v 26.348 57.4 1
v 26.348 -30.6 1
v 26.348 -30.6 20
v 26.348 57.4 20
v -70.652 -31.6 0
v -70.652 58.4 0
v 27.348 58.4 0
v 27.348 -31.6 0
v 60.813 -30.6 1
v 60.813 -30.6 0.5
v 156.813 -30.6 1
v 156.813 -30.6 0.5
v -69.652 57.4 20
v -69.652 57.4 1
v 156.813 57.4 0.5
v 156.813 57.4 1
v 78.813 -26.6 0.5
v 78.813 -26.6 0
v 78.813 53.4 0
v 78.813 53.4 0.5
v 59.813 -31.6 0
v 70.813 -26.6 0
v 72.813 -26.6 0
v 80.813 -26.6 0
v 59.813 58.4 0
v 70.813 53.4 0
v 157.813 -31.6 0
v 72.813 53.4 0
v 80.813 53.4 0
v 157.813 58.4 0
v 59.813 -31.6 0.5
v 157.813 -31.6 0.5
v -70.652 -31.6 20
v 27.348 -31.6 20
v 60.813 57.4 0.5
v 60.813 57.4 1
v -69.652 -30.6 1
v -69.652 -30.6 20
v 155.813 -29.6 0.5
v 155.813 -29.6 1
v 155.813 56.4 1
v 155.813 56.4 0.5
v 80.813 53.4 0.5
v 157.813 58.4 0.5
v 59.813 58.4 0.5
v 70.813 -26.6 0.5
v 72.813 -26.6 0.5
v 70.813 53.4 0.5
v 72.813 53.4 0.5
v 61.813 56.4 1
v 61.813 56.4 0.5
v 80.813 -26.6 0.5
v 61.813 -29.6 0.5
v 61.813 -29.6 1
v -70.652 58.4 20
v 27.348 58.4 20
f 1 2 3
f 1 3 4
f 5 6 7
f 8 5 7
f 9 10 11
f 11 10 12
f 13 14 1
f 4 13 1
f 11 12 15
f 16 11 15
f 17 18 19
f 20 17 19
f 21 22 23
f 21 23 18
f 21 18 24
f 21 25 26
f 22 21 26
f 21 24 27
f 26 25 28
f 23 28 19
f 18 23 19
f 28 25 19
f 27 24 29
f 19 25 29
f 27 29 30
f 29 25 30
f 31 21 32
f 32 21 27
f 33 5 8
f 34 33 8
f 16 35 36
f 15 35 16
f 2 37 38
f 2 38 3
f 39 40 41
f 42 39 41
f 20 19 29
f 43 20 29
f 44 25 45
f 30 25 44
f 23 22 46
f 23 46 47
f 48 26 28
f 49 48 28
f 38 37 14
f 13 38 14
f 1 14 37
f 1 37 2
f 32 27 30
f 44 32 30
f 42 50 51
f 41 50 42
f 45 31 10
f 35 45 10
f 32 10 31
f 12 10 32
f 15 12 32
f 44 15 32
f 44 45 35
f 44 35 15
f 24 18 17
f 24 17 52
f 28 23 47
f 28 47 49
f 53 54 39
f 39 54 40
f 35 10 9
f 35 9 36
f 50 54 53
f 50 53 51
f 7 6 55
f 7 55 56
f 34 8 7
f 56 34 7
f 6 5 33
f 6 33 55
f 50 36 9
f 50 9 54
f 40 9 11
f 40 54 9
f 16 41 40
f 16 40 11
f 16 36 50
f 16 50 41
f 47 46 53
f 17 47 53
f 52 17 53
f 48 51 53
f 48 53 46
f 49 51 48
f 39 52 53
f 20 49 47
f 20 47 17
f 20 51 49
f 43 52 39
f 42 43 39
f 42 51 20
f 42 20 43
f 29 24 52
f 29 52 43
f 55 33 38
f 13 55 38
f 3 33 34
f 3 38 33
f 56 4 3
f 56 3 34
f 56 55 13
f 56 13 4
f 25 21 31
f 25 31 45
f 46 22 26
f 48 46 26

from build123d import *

# Parameters (mm, degrees)
F0_W     = 98
F0_H     = 90
F0_W_2   = 96
F0_H_2   = 88
F1_DEPTH = 20
F2_DEPTH = 1
F3_DEPTH = 0.5
F0_W_3   = 2
F0_H_3   = 80
F4_DEPTH = 1
F5_W     = 94
F5_H     = 86
F5_W_2   = 2
F5_H_2   = 80
F6_DEPTH = 0.5


with BuildPart() as f1:
    # F0 (on Top) → F1 (new body)
    with BuildSketch(Plane.XY):
        with Locations((-21.652328, 13.399996)):
            Rectangle(F0_W, F0_H)
        with Locations((-21.652328, 13.399996)):
            Rectangle(F0_W_2, F0_H_2, mode=Mode.SUBTRACT)
    extrude(amount=F1_DEPTH)

    # F0 (on Top) → F2 (join)
    with BuildSketch(Plane.XY):
        with Locations((-21.652328, 13.399996)):
            Rectangle(F0_W_2, F0_H_2)
    extrude(amount=F2_DEPTH)


with BuildPart() as f3:
    # F0 (on Top) → F3 (new body)
    with BuildSketch(Plane.XY):
        with Locations((108.812911, 13.399996)):
            Rectangle(F0_W, F0_H)
        with Locations((108.812911, 13.399996)):
            Rectangle(F0_W_2, F0_H_2, mode=Mode.SUBTRACT)
    extrude(amount=F3_DEPTH)

    # F0 (on Top) → F4 (join)
    with BuildSketch(Plane.XY):
        with Locations((108.812911, 13.399996)):
            Rectangle(F0_W_2, F0_H_2)
        with Locations((71.812911, 13.399996)):
            Rectangle(F0_W_3, F0_H_3, mode=Mode.SUBTRACT)
        with Locations((79.812911, 13.399996)):
            Rectangle(F0_W_3, F0_H_3, mode=Mode.SUBTRACT)
    extrude(amount=F4_DEPTH)

    # F5 (on face) → F6 (cut)
    with BuildSketch(Plane.XY.offset(1)):
        with Locations((108.812911, 13.399996)):
            Rectangle(F5_W, F5_H)
        with Locations((71.812911, 13.399996)):
            Rectangle(F5_W_2, F5_H_2, mode=Mode.SUBTRACT)
        with Locations((79.812911, 13.399996)):
            Rectangle(F5_W_2, F5_H_2, mode=Mode.SUBTRACT)
    extrude(amount=-F6_DEPTH, mode=Mode.SUBTRACT)


solid = Compound([f1.part, f3.part])
